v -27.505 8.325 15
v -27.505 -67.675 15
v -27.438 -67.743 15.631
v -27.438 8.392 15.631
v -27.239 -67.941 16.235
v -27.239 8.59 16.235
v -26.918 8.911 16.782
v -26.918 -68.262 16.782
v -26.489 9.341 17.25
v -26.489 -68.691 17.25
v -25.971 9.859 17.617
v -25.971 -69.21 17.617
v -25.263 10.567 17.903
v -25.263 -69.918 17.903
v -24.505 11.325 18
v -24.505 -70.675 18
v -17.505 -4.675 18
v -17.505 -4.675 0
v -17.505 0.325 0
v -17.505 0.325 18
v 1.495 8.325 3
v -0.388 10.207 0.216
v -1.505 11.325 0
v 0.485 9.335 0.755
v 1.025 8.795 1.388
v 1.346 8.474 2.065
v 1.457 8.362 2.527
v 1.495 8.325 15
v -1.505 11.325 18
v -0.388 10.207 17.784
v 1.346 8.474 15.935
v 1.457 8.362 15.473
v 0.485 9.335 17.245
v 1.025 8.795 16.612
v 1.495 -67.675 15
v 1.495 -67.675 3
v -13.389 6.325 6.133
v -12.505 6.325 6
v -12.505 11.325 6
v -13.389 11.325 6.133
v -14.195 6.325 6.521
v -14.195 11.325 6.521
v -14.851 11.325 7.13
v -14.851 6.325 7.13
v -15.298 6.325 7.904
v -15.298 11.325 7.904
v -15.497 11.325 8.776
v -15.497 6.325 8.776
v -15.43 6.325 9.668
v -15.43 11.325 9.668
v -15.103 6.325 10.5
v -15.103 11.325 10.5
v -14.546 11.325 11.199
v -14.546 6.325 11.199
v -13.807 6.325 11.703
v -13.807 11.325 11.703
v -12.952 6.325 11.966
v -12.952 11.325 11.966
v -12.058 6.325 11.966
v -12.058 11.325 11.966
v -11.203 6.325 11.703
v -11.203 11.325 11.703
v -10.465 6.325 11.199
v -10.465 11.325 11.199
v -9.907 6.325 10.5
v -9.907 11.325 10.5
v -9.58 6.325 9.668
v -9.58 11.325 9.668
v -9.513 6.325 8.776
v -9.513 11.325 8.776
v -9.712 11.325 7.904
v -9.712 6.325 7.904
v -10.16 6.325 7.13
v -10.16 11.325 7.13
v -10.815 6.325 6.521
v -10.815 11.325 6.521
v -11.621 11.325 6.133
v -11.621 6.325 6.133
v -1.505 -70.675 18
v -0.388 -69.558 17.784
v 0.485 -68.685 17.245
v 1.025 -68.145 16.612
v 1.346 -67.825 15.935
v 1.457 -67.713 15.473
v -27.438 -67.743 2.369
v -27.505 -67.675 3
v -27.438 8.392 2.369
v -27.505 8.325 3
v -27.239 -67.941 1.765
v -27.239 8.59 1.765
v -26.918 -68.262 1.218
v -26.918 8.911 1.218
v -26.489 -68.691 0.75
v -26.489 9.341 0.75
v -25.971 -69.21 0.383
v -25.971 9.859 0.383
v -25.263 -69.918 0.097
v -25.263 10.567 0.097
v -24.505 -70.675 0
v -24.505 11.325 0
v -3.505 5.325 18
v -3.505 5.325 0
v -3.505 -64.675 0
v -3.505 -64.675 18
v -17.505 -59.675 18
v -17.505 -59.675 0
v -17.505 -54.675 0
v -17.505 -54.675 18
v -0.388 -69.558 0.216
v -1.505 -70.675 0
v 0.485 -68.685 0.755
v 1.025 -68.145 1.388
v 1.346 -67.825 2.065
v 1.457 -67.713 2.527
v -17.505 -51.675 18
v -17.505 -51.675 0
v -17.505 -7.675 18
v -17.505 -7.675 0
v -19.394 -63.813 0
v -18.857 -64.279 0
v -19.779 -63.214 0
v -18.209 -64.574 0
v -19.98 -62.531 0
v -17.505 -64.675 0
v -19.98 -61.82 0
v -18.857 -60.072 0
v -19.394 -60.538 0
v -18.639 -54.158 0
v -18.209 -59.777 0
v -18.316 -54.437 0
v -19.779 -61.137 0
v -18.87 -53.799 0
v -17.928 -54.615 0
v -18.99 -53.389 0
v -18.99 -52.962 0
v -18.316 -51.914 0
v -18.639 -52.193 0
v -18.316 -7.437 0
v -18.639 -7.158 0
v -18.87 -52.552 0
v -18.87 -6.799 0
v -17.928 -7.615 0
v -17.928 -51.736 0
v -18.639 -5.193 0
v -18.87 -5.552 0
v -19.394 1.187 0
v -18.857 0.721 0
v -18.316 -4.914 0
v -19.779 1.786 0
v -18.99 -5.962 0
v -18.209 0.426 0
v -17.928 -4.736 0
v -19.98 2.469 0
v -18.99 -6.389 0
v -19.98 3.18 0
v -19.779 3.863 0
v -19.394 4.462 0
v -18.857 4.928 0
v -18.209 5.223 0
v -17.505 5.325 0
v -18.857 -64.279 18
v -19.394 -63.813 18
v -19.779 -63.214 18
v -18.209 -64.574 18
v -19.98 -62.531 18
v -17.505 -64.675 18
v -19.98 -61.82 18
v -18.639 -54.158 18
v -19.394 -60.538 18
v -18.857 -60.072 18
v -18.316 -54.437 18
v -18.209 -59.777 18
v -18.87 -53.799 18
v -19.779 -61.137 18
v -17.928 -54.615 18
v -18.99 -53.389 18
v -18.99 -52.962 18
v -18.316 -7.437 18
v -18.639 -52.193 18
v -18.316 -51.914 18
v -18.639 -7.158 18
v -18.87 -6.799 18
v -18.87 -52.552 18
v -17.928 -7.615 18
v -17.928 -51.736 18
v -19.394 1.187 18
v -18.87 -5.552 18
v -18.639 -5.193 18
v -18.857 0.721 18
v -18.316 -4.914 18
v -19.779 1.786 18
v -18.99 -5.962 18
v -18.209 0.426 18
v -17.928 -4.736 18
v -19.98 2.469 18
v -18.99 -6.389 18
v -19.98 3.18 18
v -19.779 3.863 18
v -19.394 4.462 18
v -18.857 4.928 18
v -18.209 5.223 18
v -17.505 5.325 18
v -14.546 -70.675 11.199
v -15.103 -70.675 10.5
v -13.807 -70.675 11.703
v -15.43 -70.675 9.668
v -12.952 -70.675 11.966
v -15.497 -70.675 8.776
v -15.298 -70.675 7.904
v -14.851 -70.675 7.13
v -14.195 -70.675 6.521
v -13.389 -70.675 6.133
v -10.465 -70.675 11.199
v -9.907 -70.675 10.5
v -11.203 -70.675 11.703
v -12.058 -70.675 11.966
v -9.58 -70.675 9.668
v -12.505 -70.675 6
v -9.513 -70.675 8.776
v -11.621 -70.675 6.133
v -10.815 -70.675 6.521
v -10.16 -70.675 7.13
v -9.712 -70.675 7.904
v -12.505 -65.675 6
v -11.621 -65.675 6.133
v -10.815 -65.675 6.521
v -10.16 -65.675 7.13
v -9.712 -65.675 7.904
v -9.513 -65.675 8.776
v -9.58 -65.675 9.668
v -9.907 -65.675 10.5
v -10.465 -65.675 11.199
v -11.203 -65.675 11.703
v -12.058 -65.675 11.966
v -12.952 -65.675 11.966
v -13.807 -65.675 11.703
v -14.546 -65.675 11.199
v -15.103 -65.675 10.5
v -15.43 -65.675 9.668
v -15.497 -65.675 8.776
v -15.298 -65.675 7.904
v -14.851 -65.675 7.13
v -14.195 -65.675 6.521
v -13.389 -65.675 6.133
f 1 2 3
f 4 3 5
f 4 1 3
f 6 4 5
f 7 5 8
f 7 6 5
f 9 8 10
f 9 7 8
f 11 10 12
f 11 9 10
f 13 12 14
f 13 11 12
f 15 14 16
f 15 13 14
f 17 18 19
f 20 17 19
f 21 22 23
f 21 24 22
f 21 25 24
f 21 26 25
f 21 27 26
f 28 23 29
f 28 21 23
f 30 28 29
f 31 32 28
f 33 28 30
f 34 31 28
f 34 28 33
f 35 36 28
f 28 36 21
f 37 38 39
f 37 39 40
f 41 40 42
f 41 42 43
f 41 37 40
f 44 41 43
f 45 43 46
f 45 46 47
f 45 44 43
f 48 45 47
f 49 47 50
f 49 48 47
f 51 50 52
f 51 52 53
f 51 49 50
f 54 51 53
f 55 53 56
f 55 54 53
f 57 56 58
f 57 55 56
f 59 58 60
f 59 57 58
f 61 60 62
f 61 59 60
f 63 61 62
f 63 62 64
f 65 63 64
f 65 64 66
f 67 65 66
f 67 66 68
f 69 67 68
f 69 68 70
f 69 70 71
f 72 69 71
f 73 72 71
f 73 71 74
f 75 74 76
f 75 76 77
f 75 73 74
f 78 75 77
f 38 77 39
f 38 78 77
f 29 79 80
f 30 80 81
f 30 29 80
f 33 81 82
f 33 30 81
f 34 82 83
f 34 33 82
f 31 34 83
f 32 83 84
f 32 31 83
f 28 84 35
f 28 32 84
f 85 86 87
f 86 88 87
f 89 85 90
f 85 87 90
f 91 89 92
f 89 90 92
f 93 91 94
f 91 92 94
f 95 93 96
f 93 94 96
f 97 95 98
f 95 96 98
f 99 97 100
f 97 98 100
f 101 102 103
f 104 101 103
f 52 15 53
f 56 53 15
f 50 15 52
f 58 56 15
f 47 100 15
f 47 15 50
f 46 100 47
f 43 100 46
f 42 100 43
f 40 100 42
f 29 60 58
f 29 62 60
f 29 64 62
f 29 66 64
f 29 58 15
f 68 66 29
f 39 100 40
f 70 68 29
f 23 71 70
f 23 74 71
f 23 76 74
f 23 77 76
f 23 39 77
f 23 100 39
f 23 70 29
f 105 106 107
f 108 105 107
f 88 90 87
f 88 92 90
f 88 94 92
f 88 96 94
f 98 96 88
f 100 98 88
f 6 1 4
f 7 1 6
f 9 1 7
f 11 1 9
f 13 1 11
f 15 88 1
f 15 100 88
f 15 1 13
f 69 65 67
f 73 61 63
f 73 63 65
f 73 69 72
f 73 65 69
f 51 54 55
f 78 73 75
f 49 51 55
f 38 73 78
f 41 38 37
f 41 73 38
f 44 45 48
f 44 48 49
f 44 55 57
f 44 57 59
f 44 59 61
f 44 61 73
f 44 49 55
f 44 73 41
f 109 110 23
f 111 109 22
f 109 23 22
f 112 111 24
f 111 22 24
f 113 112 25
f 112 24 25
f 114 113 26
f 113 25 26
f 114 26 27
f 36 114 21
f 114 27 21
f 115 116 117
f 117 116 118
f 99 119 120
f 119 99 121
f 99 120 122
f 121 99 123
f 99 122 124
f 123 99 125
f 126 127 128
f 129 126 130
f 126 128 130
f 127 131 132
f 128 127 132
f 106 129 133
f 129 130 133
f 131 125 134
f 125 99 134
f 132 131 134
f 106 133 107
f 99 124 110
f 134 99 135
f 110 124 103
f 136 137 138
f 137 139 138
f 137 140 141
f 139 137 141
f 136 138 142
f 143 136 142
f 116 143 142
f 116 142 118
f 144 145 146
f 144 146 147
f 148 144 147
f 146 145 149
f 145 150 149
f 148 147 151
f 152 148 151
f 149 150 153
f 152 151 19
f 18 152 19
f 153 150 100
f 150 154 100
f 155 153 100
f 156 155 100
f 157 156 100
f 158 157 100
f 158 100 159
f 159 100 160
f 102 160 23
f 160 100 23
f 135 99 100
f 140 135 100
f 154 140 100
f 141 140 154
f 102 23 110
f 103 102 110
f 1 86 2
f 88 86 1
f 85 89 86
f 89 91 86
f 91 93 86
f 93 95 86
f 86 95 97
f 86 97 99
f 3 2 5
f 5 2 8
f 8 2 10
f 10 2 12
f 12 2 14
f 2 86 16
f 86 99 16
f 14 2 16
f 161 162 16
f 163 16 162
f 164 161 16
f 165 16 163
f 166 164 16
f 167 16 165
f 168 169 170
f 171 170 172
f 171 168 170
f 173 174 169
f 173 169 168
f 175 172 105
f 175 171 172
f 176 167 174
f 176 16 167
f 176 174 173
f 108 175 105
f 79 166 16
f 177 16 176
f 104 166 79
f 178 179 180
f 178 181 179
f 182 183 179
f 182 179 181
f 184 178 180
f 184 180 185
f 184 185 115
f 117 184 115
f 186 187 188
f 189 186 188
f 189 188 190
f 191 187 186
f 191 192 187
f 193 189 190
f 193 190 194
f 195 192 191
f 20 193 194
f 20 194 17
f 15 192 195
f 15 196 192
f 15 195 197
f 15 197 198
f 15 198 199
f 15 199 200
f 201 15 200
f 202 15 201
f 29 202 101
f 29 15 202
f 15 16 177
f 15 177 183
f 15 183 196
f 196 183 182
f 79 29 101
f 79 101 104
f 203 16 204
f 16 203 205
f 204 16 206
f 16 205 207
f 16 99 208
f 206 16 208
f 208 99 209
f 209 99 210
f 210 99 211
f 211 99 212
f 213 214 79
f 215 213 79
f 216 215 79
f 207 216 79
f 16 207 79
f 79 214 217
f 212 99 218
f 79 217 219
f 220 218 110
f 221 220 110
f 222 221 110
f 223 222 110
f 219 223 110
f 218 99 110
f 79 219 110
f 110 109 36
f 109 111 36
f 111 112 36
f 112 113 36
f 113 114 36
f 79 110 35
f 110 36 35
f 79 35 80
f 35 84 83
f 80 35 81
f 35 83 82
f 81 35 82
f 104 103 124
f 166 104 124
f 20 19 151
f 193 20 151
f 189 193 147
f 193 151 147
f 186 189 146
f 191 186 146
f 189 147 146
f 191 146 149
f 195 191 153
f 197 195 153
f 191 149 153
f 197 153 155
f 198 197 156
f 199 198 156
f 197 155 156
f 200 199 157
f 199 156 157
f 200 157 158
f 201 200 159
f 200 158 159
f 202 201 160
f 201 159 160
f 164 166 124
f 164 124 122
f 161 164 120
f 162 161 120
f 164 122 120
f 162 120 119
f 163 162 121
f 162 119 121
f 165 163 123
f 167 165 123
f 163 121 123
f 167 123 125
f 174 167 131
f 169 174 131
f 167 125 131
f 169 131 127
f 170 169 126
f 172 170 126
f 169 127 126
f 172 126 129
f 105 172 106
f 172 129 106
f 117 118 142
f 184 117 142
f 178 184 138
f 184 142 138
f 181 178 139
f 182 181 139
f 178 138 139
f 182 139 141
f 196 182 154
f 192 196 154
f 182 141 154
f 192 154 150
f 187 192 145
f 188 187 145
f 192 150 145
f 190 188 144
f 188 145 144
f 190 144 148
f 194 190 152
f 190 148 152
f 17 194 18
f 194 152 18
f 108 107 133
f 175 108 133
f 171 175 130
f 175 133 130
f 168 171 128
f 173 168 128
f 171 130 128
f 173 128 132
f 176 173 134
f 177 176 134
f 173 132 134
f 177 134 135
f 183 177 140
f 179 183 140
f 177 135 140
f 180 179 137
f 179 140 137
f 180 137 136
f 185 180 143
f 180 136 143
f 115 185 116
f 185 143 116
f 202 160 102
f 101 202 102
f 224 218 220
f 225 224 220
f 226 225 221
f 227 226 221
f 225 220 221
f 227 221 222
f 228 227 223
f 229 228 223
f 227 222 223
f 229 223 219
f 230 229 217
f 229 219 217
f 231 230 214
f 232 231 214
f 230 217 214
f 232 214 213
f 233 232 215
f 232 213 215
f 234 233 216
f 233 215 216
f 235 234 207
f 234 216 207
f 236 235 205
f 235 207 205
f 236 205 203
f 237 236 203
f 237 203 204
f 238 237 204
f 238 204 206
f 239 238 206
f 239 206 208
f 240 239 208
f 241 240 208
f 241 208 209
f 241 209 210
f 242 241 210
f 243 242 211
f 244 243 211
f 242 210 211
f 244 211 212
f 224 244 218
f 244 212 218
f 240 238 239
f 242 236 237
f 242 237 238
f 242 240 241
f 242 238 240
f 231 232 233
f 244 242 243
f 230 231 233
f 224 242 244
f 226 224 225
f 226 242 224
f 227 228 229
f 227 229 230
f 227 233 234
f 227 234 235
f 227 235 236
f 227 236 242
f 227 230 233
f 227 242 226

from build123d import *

# Parameters (mm, degrees)
SKETCH_1_W          = 29
SKETCH_1_H          = 82
EXTRUDE_1_DEPTH     = 18
CHAMFER_1_SIZE      = 3
FILLET_1_R          = 3
SKETCH_2_R          = 3
CUT_EXTRUDE_1_DEPTH = 5
CUT_EXTRUDE_START   = -5
SKETCH_3_R          = 3
CUT_EXTRUDE_2_DEPTH = 5


with BuildPart() as part:
    # 草图1 → 凸台-拉伸1 (new body)
    with BuildSketch(Plane.XY):
        with Locations((-13.005076144, -29.675385896)):
            Rectangle(SKETCH_1_W, SKETCH_1_H)
        with BuildLine():
            Line((-3.505076144, 5.324614104), (-3.505076144, -64.675385896))
            Line((-3.505076144, -64.675385896), (-17.505076144, -64.675385896))
            ThreePointArc((-17.505076144, -64.675385896), (-20.005076144, -62.175385896), (-17.505076144, -59.675385896))
            Line((-17.505076144, -59.675385896), (-17.505076144, -54.675385896))
            ThreePointArc((-17.505076144, -54.675385896), (-19.005076144, -53.175385896), (-17.505076144, -51.675385896))
            Line((-17.505076144, -51.675385896), (-17.505076144, -7.675385896))
            ThreePointArc((-17.505076144, -7.675385896), (-19.005076144, -6.175385896), (-17.505076144, -4.675385896))
            Line((-17.505076144, -4.675385896), (-17.505076144, 0.324614104))
            ThreePointArc((-17.505076144, 0.324614104), (-20.005076144, 2.824614104), (-17.505076144, 5.324614104))
            Line((-17.505076144, 5.324614104), (-3.505076144, 5.324614104))
        make_face(mode=Mode.SUBTRACT)
    extrude(amount=EXTRUDE_1_DEPTH)

    # 倒角1
    chamfer_1_edges = [part.edges().sort_by_distance(p)[0] for p in [
        (1.494923856, 11.324614104, 9),
        (1.494923856, -70.675385896, 9),
        (-27.505076144, -70.675385896, 9),
        (-27.505076144, 11.324614104, 9),
    ]]
    chamfer(chamfer_1_edges, length=CHAMFER_1_SIZE)

    # 圆角1
    fillet_1_edges = [part.edges().sort_by_distance(p)[0] for p in [
        (-27.505076144, -29.675385896, 0),
        (-27.505076144, -29.675385896, 18),
        (1.494923856, -29.675385896, 0),
        (1.494923856, -29.675385896, 18),
    ]]
    fillet(fillet_1_edges, radius=FILLET_1_R)

    # 草图2 → 切除-拉伸1 (cut)
    with BuildSketch(Plane.XZ.offset(70.675385896)):
        with Locations(Location((-12.505076144, 9, 0), (0, 0, 270))):
            Circle(SKETCH_2_R)
    extrude(amount=-CUT_EXTRUDE_1_DEPTH, mode=Mode.SUBTRACT)

    # 草图3 → 切除-拉伸2 (cut)
    with BuildSketch(Plane(origin=(0, 11.324614104, 0), x_dir=(1, 0, 0), z_dir=(0, 1, 0)).offset(CUT_EXTRUDE_START)):
        with Locations(Location((-12.505076144, -9, 0), (0, 0, 90))):
            Circle(SKETCH_3_R)
    extrude(amount=CUT_EXTRUDE_2_DEPTH, mode=Mode.SUBTRACT)


solid = part.part
